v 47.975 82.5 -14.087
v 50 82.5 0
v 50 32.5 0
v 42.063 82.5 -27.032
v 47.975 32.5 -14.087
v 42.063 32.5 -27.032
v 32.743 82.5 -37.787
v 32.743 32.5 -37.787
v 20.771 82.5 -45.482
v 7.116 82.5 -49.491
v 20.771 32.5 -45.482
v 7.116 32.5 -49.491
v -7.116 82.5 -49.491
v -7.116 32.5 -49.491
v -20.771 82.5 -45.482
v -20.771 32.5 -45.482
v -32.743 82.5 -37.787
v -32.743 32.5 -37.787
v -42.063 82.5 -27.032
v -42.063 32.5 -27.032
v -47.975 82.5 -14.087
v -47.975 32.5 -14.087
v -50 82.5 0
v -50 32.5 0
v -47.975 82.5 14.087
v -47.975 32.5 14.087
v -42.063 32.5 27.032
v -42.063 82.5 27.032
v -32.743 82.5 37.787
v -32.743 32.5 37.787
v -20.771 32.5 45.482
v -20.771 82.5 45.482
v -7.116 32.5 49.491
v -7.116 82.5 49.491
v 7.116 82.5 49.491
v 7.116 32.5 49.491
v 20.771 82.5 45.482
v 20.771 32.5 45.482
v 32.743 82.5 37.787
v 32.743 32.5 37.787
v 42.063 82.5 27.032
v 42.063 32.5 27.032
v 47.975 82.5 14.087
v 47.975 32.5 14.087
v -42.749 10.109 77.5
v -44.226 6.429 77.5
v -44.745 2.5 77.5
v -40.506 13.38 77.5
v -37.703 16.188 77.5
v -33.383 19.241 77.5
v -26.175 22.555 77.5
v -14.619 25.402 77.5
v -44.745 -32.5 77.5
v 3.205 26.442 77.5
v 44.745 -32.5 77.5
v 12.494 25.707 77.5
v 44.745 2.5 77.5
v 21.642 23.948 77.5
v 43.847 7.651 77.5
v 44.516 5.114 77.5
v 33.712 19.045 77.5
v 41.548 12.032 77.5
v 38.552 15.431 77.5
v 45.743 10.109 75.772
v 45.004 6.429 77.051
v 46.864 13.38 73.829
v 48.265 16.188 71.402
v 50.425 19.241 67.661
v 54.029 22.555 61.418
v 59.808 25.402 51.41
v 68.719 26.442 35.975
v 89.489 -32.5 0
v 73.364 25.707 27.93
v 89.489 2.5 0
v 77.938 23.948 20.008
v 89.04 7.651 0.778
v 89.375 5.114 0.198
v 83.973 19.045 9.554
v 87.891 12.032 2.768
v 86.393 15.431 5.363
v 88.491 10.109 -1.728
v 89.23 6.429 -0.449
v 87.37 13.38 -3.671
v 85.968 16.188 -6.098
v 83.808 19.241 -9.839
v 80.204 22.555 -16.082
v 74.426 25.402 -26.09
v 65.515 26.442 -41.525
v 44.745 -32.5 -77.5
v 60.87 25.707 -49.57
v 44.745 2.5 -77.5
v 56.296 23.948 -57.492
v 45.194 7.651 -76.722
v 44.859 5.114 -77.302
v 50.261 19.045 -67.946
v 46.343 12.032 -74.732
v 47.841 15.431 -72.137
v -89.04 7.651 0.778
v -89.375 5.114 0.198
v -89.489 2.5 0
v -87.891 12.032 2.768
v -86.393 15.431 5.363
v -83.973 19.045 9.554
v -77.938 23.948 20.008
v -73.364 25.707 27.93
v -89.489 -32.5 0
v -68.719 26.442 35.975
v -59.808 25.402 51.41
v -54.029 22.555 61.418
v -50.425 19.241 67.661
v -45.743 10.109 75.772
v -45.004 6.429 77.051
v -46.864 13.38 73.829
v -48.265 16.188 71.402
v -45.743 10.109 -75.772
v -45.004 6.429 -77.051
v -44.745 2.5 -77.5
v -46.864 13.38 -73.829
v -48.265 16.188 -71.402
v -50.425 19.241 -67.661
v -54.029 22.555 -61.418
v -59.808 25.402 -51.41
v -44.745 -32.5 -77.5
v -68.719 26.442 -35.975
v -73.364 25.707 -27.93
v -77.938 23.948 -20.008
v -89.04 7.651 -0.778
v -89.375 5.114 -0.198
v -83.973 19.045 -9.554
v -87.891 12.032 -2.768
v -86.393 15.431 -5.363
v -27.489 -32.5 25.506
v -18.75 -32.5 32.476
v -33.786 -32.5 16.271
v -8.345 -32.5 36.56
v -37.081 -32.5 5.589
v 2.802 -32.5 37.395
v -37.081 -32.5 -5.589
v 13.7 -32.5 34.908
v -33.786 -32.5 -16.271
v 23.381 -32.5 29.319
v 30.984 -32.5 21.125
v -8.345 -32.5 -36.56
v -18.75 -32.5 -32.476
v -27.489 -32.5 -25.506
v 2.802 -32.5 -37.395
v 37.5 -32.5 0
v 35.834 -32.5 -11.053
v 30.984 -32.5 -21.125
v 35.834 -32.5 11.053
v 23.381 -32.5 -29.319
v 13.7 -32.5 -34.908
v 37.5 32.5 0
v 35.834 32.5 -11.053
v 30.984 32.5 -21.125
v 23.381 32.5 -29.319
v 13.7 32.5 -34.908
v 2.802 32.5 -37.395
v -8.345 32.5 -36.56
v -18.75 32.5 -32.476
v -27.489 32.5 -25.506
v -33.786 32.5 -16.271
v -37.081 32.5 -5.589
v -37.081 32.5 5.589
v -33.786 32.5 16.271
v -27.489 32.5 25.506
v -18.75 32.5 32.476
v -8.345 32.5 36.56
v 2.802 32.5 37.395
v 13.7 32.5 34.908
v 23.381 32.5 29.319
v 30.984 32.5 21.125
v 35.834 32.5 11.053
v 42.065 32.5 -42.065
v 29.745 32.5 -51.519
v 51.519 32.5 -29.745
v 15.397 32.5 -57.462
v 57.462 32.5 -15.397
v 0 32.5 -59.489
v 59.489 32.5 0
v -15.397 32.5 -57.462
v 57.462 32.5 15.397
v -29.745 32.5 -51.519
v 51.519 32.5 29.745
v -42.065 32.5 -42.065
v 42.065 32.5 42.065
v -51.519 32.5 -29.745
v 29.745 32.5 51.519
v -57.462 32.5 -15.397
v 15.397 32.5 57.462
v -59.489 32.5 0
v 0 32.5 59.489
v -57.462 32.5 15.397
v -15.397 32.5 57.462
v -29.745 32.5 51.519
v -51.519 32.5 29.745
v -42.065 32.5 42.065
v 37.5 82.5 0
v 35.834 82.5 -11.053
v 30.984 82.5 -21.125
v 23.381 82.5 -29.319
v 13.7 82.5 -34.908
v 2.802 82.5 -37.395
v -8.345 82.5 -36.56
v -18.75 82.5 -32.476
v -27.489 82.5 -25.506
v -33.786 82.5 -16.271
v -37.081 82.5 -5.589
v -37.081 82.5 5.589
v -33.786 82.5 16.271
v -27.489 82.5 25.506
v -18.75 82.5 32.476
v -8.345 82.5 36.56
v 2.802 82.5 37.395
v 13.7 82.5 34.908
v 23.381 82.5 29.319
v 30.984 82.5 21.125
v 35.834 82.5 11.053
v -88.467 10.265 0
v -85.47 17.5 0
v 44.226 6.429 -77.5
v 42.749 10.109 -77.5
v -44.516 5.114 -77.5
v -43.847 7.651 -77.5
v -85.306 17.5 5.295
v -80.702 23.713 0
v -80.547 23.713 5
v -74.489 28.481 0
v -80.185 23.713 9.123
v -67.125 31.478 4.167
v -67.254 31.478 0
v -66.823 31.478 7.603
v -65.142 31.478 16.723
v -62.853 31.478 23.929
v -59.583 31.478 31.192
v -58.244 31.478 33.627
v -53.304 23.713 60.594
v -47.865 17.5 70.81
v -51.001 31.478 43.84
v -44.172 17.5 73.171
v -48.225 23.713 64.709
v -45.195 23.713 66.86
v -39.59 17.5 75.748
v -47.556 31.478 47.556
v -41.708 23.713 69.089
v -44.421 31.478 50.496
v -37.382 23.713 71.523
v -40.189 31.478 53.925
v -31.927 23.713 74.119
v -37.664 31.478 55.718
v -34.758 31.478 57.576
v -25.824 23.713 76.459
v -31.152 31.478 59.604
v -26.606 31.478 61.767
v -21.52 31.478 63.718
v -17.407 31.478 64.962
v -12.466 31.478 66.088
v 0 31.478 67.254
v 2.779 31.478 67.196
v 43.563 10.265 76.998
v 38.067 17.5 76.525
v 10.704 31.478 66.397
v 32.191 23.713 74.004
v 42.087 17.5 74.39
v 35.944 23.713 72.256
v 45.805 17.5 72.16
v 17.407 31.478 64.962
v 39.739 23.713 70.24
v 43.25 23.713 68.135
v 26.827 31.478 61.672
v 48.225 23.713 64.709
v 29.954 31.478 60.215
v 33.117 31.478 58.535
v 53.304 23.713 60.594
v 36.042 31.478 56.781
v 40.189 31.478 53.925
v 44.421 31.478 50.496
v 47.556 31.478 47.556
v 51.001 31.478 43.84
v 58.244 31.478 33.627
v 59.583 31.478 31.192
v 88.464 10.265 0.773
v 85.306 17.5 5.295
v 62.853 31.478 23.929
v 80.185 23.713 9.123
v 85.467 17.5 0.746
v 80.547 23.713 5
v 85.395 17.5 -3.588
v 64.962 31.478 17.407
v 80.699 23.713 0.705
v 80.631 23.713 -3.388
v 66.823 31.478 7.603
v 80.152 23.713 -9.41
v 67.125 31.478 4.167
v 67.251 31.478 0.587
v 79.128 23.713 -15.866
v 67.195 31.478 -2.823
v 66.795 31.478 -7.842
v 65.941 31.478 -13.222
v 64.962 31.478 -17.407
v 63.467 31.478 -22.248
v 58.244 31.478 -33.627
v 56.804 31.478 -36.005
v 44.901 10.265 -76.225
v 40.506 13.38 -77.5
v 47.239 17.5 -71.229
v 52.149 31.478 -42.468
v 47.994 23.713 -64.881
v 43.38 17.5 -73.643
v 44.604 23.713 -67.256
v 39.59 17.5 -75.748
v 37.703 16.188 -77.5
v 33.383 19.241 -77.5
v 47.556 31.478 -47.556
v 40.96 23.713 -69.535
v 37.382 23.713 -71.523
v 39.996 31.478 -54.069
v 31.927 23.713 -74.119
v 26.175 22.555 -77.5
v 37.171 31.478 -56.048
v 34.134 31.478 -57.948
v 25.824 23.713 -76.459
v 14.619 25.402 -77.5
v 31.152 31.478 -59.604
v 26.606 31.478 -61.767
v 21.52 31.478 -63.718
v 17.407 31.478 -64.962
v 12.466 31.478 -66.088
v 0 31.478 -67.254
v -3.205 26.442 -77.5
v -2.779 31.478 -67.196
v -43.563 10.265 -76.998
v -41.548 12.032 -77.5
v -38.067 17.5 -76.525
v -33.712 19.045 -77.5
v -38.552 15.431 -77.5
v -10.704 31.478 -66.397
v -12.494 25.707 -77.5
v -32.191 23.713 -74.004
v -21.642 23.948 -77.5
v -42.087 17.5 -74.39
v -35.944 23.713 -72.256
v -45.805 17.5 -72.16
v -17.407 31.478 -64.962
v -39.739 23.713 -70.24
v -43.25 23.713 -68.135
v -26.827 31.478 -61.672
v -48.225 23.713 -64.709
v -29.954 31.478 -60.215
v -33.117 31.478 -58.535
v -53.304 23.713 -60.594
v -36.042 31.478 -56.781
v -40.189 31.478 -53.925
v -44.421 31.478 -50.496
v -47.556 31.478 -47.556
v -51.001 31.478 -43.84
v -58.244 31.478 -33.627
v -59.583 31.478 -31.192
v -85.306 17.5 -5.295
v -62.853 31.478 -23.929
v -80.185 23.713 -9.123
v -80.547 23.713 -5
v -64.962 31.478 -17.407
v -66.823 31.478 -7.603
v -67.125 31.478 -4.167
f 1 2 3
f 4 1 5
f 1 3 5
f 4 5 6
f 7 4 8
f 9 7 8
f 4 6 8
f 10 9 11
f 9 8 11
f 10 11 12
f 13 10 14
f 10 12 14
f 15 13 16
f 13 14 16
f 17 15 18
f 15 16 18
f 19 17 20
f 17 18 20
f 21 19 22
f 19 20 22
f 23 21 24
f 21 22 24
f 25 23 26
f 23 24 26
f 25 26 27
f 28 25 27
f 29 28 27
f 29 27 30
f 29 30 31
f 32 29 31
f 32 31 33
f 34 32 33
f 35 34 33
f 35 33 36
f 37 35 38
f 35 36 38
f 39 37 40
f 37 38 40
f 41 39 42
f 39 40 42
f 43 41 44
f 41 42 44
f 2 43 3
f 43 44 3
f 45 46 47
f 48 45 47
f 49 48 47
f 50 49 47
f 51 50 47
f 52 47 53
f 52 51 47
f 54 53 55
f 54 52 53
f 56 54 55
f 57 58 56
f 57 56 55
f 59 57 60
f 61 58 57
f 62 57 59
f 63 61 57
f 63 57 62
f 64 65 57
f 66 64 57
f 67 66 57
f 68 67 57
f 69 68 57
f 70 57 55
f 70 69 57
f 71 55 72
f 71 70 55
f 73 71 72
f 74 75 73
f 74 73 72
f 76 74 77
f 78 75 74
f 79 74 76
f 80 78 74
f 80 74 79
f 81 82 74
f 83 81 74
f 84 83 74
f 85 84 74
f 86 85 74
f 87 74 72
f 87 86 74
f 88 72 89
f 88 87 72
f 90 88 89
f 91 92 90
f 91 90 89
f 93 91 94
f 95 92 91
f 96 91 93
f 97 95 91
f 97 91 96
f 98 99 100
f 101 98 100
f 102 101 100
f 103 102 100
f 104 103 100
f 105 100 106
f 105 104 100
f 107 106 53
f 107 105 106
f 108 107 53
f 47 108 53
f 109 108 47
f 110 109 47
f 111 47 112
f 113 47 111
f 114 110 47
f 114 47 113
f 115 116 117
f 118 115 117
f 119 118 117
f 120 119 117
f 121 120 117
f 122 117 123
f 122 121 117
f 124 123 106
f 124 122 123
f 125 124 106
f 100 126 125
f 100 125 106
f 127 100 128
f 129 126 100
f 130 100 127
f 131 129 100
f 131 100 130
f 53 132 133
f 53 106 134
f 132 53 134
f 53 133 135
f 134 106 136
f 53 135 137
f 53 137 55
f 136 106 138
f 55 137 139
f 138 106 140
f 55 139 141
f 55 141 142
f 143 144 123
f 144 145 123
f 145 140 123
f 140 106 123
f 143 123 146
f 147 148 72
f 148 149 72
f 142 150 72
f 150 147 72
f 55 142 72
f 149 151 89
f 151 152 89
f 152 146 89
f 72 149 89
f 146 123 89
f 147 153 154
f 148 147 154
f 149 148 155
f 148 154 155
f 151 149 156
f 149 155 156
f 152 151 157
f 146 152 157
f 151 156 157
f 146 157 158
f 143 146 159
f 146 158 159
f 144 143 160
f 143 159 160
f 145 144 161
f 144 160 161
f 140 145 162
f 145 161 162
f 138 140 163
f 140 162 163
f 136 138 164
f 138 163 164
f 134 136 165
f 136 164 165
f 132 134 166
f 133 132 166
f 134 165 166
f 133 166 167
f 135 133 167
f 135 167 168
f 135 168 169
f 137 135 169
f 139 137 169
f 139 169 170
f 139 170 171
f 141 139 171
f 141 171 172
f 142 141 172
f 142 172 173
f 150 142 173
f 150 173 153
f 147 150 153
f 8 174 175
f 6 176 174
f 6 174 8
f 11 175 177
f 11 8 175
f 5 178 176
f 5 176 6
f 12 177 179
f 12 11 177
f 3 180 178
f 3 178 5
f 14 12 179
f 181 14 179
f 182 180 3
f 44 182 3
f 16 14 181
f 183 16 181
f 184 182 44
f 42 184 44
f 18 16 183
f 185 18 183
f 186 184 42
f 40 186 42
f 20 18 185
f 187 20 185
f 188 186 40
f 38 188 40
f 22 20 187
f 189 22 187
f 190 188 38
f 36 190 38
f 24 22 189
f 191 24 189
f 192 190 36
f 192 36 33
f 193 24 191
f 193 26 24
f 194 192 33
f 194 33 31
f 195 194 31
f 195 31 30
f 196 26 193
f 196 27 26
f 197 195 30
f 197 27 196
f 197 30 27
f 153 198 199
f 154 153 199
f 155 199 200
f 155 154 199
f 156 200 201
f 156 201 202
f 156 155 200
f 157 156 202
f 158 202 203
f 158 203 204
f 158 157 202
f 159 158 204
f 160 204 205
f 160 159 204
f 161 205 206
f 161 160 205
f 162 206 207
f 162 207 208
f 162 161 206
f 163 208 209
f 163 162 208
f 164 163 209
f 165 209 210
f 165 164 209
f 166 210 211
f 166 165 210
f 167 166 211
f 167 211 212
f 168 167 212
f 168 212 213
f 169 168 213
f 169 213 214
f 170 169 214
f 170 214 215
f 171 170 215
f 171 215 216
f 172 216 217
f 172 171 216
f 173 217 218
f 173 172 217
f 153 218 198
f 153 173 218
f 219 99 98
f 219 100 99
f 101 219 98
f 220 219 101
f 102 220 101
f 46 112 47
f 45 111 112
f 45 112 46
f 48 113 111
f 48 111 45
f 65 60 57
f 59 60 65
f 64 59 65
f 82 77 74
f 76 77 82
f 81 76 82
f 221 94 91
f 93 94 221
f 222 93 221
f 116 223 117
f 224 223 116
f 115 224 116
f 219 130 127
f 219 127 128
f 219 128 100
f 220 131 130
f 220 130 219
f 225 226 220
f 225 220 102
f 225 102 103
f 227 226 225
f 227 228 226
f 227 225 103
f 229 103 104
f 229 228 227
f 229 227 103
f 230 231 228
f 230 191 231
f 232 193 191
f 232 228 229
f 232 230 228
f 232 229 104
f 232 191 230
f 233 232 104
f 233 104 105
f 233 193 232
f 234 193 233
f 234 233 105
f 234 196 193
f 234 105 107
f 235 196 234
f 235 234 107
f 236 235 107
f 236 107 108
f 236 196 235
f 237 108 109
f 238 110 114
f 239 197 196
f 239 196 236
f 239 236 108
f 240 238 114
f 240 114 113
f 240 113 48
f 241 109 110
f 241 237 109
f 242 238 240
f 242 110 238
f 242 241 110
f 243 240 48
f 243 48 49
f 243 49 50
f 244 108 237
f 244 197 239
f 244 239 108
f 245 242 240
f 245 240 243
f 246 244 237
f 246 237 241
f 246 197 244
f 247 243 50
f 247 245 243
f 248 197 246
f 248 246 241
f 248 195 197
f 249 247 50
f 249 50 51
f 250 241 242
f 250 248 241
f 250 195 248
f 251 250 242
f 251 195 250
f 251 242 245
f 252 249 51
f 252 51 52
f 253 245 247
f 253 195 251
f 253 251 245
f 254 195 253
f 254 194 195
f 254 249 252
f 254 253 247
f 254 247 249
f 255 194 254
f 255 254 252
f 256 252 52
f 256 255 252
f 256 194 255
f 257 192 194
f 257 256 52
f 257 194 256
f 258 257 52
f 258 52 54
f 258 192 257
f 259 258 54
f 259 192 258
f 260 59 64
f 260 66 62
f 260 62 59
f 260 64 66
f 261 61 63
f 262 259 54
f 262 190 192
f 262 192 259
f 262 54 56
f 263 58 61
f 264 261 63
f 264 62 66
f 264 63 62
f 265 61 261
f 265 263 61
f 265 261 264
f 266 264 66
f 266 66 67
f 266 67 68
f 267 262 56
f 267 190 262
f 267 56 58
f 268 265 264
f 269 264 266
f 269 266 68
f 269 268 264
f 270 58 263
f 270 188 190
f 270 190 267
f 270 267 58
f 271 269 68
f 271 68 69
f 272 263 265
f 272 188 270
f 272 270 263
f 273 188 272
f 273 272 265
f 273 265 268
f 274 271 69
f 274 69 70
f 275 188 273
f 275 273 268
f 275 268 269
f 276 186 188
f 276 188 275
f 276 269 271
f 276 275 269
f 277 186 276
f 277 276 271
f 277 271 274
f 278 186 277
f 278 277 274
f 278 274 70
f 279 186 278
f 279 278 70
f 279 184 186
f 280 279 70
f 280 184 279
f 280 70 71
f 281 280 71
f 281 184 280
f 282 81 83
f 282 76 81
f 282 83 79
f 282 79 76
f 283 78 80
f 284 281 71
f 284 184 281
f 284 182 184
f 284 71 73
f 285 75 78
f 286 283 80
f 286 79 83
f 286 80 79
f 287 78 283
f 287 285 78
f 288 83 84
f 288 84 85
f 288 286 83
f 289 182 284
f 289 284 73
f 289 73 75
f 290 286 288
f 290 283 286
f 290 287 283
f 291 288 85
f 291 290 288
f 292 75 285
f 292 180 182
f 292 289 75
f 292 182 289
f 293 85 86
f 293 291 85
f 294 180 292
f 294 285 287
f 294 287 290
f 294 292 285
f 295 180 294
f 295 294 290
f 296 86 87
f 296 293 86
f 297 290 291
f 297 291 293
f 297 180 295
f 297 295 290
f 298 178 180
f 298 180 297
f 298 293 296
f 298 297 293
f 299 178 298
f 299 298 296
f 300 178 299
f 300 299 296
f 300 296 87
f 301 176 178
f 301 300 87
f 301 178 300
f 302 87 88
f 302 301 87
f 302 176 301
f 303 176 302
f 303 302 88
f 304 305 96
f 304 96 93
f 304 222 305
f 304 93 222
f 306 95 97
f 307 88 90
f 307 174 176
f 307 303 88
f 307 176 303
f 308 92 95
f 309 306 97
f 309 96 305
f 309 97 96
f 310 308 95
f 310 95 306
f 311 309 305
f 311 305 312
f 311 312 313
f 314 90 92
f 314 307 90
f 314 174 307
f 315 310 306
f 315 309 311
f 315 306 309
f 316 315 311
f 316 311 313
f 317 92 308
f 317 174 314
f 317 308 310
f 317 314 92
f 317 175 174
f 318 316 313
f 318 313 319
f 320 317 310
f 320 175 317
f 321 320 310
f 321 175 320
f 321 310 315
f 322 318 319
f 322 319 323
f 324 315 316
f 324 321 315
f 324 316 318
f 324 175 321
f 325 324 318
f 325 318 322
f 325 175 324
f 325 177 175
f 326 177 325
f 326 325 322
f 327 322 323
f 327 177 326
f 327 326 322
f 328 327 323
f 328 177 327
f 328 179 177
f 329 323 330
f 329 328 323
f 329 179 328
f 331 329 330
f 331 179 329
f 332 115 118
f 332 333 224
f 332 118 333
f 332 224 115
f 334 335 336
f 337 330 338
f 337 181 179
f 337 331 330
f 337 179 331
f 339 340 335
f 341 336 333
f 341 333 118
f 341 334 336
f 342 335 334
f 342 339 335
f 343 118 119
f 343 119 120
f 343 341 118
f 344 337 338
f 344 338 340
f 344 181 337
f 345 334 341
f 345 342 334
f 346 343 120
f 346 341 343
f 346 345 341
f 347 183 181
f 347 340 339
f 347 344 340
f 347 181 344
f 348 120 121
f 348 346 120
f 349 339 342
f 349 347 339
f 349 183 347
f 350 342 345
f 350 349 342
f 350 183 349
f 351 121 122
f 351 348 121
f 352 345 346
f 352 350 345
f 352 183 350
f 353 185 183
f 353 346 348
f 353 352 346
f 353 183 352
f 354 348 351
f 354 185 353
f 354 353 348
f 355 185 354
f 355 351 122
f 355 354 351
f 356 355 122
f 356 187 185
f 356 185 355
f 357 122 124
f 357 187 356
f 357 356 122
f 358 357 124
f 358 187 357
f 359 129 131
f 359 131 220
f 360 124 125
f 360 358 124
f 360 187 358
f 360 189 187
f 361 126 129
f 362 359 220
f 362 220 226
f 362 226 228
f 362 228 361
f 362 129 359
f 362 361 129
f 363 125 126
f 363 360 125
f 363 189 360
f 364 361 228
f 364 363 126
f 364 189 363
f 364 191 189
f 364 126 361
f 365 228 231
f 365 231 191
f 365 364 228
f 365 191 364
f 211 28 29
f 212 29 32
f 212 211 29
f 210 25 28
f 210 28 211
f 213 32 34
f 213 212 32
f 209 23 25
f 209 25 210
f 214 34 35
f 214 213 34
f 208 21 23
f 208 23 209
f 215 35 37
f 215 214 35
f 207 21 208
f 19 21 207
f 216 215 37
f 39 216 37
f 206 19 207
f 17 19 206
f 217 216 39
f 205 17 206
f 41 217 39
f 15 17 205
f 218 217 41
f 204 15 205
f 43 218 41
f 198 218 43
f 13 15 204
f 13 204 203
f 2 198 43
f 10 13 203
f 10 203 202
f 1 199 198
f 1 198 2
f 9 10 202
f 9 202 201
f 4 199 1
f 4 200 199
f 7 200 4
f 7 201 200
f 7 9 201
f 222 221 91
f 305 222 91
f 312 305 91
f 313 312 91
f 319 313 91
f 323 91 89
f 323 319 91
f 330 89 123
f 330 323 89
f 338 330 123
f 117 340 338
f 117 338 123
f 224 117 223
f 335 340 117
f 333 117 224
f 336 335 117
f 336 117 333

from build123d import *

# Parameters (mm, degrees)
BOSS_EXTRUDE1_DEPTH = 32.5
SKETCH3_R           = 50
SKETCH3_R_2         = 37.5
BOSS_EXTRUDE2_DEPTH = 50
SKETCH4_R           = 37.5
CUT_EXTRUDE1_DEPTH  = 94


with BuildPart() as part:
    # Sketch1 → Boss-Extrude1 (new body, symmetric)
    with BuildSketch(Plane(origin=(0, 0, 0), x_dir=(1, 0, 0), z_dir=(0, 1, 0))):
        Polygon((-89.489291724, 0), (-44.744645862, -77.5), (44.744645862, -77.5), (89.489291724, 0), (44.744645862, 77.5), (-44.744645862, 77.5), align=None)
    extrude(amount=BOSS_EXTRUDE1_DEPTH, both=True)

    # Sketch2 → Cut-Revolve1 (revolve, cut)
    with BuildSketch(Plane.XY):
        with BuildLine():
            Line((-59.489291724, 32.5), (-57.951385683, 32.5))
            Line((-57.951385683, 32.5), (-79.245811776, 59.780712904))
            Line((-79.245811776, 59.780712904), (-106.219123603, 23.051452734))
            Line((-106.219123603, 23.051452734), (-89.489291724, -3.938998624))
            Line((-89.489291724, -3.938998624), (-89.489291724, 2.5))
            ThreePointArc((-89.489291724, 2.5), (-80.70249516, 23.713203436), (-59.489291724, 32.5))
        make_face()
    revolve(axis=Axis((0, 0, 0), (0, 1, 0)), mode=Mode.SUBTRACT)

    # Sketch3 → Boss-Extrude2 (add)
    with BuildSketch(Plane(origin=(0, 32.5, 0), x_dir=(1, 0, 0), z_dir=(0, 1, 0))):
        Circle(SKETCH3_R)
        Circle(SKETCH3_R_2, mode=Mode.SUBTRACT)
    extrude(amount=BOSS_EXTRUDE2_DEPTH)

    # Sketch4 → Cut-Extrude1 (cut)
    with BuildSketch(Plane(origin=(0, 32.5, 0), x_dir=(1, 0, 0), z_dir=(0, 1, 0))):
        Circle(SKETCH4_R)
    extrude(amount=-CUT_EXTRUDE1_DEPTH, mode=Mode.SUBTRACT)


solid = part.part
